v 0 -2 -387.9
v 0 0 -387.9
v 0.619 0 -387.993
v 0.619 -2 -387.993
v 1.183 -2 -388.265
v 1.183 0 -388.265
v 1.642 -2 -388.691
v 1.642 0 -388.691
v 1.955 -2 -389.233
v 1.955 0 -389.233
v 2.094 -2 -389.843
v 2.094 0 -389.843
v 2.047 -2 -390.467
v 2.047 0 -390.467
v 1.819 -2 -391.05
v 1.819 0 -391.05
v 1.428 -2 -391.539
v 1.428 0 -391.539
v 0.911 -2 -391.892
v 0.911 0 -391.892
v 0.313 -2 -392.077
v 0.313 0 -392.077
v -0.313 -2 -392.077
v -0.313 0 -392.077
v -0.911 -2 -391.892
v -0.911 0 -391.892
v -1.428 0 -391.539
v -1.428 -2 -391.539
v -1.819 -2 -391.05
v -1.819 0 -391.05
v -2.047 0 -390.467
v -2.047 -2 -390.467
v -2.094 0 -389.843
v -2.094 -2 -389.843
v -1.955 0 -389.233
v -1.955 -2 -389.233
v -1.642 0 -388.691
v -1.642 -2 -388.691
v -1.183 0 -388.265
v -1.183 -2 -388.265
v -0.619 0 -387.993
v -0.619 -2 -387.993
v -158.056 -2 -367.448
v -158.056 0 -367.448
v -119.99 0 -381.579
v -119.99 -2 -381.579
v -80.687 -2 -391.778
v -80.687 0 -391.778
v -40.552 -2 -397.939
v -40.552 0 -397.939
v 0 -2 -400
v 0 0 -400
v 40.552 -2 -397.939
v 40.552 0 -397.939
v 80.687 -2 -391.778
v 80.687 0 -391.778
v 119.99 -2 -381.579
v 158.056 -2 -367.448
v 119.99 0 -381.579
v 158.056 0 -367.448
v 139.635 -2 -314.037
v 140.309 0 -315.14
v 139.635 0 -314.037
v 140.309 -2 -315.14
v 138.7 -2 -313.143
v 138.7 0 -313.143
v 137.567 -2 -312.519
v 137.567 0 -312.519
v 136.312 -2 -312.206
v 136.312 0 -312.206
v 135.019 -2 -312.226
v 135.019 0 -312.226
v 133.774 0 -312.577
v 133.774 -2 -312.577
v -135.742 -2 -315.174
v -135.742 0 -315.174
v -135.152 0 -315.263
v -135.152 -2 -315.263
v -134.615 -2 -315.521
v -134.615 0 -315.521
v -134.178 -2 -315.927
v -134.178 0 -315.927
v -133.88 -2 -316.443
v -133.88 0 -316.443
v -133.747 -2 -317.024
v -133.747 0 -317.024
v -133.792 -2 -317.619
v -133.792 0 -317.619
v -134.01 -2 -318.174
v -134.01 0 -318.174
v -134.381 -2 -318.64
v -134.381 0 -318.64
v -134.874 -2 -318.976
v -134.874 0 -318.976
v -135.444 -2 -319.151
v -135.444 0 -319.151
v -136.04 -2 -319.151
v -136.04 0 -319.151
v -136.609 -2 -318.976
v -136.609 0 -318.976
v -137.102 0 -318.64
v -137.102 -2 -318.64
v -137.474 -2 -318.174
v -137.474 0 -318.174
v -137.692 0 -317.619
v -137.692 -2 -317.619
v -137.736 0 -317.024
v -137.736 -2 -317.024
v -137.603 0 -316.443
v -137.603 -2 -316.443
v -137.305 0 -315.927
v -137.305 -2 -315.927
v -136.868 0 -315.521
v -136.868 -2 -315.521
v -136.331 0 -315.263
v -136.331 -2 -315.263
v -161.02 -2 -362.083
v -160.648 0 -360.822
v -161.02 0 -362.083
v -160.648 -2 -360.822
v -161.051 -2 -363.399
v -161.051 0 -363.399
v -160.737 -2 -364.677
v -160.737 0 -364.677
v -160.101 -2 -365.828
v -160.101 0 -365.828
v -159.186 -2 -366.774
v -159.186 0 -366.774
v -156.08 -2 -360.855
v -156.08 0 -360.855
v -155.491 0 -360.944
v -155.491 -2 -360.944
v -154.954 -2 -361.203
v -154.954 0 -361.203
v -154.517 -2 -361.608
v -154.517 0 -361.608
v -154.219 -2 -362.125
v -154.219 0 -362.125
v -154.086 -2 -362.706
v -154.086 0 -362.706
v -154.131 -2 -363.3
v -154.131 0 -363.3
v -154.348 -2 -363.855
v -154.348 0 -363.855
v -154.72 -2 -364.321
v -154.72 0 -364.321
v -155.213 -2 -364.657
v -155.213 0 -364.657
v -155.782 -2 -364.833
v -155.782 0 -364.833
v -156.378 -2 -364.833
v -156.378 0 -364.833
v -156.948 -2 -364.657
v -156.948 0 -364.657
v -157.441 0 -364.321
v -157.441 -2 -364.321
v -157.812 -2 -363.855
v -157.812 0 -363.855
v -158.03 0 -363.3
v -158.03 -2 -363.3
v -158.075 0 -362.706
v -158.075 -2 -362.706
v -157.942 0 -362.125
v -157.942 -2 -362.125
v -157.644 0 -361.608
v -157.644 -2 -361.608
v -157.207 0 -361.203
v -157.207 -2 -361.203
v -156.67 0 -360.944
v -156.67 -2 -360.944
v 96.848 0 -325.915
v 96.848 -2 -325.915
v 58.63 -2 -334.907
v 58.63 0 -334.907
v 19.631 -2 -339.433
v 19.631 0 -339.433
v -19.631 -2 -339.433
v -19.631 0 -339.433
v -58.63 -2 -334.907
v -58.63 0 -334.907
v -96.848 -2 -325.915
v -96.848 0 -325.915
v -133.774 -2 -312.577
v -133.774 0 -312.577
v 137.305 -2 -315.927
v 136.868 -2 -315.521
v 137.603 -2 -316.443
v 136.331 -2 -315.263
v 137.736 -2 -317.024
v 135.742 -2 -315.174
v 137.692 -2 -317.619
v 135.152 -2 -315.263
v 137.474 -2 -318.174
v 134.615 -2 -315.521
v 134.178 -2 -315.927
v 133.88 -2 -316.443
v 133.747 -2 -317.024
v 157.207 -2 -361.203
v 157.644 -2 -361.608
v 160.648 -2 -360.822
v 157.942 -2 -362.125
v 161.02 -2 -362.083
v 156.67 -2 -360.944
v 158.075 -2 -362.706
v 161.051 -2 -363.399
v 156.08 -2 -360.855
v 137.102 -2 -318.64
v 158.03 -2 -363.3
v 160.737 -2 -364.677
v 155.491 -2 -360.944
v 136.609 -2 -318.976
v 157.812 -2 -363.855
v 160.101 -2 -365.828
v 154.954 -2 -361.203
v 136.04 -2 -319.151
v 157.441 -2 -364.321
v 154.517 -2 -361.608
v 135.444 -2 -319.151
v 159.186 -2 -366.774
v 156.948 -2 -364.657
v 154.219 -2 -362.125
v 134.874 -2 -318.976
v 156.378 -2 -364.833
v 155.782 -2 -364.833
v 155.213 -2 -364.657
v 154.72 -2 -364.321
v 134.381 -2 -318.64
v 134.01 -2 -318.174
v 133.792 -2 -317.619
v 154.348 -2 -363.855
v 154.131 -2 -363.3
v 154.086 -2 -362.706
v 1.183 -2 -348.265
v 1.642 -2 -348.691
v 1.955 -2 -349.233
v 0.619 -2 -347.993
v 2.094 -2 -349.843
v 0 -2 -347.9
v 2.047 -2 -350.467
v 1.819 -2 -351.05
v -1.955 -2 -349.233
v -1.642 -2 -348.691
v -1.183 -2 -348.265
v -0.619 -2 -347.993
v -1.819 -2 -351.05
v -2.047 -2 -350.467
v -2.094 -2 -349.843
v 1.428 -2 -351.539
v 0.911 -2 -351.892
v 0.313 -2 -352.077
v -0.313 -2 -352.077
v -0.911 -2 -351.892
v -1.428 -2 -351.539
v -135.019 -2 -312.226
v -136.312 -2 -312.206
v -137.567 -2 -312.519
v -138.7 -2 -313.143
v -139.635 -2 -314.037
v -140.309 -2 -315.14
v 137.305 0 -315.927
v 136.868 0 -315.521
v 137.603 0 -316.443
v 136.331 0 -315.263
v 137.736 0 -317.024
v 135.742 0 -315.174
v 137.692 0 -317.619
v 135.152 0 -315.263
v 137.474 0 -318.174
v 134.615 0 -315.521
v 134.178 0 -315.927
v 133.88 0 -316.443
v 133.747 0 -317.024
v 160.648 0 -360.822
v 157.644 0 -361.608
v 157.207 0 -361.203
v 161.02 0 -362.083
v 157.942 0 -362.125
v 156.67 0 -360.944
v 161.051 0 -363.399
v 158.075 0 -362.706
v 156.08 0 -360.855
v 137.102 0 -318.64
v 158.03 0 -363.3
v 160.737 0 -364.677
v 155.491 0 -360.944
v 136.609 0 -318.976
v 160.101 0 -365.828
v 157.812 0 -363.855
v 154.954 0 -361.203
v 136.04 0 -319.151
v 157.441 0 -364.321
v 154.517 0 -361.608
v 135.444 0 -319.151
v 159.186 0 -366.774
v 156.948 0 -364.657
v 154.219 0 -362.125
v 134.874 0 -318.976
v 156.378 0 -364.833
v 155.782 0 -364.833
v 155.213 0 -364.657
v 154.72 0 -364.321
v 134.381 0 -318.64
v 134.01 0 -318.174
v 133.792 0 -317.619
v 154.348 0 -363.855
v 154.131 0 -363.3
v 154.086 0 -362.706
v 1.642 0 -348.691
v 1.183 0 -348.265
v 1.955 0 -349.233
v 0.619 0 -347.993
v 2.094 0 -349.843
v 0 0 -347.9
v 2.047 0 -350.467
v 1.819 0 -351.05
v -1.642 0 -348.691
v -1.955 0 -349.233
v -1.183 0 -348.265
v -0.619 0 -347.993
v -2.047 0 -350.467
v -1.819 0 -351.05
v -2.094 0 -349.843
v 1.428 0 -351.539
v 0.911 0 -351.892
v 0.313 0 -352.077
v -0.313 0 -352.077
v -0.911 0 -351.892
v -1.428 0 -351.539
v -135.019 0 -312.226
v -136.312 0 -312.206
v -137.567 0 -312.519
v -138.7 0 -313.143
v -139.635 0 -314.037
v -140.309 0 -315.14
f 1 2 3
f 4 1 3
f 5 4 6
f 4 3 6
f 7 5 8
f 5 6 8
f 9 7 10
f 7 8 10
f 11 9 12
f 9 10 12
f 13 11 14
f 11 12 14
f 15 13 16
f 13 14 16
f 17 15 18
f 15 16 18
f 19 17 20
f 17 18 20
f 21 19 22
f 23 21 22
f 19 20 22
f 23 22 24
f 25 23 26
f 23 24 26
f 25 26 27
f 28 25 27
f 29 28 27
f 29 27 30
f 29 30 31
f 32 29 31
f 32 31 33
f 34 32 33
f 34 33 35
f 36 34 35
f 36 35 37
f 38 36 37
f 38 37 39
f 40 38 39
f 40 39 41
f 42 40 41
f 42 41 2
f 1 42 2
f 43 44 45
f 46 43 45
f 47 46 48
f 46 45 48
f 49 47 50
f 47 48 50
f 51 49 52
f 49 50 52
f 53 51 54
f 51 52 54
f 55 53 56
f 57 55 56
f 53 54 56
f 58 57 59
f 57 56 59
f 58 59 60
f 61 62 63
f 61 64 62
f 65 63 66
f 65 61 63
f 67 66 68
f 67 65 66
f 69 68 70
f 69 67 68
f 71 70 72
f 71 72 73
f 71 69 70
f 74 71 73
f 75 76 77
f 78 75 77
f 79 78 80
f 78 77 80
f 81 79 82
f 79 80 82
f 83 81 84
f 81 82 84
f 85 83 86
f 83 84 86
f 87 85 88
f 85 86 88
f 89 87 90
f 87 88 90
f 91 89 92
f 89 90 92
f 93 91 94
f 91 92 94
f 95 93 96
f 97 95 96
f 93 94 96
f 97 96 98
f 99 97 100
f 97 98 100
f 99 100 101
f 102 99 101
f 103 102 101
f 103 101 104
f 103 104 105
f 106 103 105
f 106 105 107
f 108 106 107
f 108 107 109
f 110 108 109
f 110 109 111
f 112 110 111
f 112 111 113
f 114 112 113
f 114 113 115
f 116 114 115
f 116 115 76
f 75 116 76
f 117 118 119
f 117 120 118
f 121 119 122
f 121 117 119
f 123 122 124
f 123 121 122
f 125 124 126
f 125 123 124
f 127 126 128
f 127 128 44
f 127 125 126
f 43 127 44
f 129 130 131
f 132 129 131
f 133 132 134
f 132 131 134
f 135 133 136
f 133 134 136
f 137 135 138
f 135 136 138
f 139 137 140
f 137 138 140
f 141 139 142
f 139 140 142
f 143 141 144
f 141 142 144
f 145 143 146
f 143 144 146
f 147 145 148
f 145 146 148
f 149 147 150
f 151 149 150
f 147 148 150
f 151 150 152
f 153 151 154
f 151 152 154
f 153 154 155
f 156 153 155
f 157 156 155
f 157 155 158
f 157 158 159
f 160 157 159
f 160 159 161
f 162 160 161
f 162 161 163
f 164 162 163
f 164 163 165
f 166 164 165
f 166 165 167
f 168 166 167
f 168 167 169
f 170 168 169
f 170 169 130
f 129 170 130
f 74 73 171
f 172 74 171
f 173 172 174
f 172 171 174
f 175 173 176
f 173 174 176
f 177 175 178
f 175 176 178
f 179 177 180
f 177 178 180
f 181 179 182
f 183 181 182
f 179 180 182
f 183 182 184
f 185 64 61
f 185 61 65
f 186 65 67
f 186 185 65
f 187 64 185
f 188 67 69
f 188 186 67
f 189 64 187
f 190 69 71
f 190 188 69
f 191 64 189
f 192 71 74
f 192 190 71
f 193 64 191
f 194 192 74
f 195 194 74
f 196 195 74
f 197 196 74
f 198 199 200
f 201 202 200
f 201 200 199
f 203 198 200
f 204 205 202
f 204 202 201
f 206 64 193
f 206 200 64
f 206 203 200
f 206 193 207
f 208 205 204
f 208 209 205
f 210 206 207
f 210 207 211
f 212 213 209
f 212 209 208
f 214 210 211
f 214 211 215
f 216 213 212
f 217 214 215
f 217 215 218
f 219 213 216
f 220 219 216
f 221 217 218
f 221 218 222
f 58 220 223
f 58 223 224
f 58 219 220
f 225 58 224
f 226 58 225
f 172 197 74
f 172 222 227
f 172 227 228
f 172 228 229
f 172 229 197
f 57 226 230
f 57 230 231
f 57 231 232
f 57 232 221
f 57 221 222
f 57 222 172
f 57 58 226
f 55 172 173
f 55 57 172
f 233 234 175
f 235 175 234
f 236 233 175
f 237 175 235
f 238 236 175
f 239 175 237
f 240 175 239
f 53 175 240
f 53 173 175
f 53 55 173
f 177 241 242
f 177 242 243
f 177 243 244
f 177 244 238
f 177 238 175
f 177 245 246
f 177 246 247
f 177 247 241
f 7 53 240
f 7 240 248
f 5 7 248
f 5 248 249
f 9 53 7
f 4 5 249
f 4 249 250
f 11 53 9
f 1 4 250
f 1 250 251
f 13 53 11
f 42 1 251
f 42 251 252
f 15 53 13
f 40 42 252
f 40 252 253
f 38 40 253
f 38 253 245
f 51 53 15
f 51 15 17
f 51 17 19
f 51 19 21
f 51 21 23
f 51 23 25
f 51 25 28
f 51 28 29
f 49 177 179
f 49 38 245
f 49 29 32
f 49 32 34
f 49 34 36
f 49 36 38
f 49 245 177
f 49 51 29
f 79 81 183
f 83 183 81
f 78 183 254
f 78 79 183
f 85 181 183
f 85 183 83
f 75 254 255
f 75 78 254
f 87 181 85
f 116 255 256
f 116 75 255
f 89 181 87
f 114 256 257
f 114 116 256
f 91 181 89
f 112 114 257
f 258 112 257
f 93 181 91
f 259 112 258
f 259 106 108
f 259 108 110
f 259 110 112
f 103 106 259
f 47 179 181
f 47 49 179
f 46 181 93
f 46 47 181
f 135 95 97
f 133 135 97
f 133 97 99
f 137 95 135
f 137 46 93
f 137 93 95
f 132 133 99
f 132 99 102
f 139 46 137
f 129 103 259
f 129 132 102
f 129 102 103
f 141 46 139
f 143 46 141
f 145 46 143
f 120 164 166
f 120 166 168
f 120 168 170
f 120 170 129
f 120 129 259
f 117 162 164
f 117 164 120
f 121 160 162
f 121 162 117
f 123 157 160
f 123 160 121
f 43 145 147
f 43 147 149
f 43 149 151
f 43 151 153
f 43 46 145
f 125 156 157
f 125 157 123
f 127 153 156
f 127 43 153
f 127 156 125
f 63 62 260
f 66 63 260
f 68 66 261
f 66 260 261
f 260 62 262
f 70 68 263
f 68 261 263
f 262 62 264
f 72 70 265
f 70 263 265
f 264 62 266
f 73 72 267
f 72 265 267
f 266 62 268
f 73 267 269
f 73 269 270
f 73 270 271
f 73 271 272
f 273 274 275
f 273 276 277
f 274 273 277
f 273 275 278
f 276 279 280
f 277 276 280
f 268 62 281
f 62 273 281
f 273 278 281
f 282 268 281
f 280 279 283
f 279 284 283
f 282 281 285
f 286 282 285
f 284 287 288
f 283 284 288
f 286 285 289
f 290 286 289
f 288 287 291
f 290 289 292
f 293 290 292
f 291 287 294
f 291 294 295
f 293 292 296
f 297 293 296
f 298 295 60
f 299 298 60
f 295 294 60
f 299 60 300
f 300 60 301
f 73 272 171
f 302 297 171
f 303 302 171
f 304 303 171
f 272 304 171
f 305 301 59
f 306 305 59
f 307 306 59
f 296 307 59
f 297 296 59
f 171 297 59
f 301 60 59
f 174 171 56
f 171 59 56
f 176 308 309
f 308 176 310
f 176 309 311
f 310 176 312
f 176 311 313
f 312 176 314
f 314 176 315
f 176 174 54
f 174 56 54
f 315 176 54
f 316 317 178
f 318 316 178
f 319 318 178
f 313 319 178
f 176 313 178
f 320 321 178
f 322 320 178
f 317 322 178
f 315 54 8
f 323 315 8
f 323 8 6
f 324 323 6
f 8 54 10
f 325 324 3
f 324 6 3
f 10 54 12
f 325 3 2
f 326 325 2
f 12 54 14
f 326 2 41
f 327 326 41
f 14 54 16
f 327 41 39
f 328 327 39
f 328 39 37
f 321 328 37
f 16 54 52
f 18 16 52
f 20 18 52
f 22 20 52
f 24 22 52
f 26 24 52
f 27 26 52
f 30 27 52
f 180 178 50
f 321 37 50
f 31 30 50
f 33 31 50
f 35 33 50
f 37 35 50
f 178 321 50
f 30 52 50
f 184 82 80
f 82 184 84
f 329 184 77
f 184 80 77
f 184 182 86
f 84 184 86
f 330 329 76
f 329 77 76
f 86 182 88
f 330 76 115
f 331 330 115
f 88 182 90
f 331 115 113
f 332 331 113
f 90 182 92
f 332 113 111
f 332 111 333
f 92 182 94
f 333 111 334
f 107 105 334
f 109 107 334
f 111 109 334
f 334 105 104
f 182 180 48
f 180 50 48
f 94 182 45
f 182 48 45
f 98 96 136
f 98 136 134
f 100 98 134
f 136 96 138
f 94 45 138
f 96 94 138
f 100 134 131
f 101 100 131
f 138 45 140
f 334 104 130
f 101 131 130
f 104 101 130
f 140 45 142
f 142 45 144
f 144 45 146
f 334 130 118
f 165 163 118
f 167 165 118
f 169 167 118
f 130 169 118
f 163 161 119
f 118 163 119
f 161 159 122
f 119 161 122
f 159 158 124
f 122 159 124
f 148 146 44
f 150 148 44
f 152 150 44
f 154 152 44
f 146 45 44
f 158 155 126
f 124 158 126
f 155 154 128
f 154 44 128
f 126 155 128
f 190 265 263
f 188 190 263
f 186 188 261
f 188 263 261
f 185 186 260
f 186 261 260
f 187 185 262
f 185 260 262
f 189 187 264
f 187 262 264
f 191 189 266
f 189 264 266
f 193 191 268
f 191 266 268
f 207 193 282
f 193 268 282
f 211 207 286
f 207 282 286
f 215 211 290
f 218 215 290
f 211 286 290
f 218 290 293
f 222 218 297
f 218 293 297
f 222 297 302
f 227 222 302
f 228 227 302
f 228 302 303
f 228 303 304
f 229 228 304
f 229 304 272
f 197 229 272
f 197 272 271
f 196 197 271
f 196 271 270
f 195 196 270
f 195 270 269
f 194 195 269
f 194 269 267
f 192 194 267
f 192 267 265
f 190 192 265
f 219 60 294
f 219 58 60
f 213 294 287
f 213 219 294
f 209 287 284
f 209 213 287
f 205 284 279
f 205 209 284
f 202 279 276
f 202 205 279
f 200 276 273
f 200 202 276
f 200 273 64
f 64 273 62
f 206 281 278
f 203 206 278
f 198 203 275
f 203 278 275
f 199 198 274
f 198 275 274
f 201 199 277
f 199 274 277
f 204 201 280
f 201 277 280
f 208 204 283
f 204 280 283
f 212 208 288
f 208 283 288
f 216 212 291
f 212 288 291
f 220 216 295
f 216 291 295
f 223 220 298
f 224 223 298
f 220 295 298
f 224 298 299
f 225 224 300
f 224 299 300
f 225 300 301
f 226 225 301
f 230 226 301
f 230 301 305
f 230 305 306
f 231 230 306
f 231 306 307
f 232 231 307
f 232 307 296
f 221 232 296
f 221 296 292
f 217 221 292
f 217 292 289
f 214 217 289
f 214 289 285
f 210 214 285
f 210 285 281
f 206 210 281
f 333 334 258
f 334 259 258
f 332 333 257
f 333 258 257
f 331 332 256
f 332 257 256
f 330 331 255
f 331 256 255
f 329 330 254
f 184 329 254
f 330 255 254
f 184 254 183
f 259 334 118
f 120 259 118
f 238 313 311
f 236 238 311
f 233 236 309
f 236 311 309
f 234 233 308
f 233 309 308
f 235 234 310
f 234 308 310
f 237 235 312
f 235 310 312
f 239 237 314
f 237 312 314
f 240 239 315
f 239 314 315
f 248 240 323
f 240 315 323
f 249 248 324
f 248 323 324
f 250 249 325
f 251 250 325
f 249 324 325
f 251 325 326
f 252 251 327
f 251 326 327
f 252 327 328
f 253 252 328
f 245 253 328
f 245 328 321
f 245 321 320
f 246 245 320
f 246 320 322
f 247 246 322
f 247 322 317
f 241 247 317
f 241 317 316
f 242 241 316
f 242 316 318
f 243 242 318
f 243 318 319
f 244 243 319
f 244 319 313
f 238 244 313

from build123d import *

# Parameters (mm, degrees)
SM_BASE_FLANGE_1_DEPTH = 2
FILLET_1_R             = 5
SKETCH_2_R             = 2.1
CUT_EXTRUDE_1_DEPTH    = 10
SKETCH_3_R             = 2
CUT_EXTRUDE_2_DEPTH    = 10


# Sheet-metal steps are written as plain solids
with BuildPart() as part:
    # Sketch 1 → Базовая кромка1 (new body)
    with BuildSketch(Plane(origin=(0, 0, 0), x_dir=(1, 0, 0), z_dir=(0, 1, 0))):
        with BuildLine():
            Line((-138.290458646, 310.605455598), (-162.69465723, 365.418183057))
            ThreePointArc((-162.69465723, 365.418183057), (0, 400), (162.69465723, 365.418183057))
            Line((162.69465723, 365.418183057), (138.290458646, 310.605455598))
            ThreePointArc((138.290458646, 310.605455598), (0, 340), (-138.290458646, 310.605455598))
        make_face()
    extrude(amount=-SM_BASE_FLANGE_1_DEPTH)

    # Скругление1
    fillet_1_edges = [part.edges().sort_by_distance(p)[0] for p in [
        (-138.290458646, -1, -310.605455598),
        (-162.69465723, -1, -365.418183057),
        (162.69465723, -1, -365.418183057),
        (138.290458646, -1, -310.605455598),
    ]]
    fillet(fillet_1_edges, radius=FILLET_1_R)

    # Эскиз2 → Вырез-Вытянуть1 (cut)
    with BuildSketch(Plane(origin=(0, 0, 0), x_dir=(1, 0, 0), z_dir=(0, 1, 0))):
        with Locations(Location((0, 350, 0), (0, 0, 270))):
            Circle(SKETCH_2_R)
        with Locations(Location((0, 390, 0), (0, 0, 270))):
            Circle(SKETCH_2_R)
    extrude(amount=-CUT_EXTRUDE_1_DEPTH, mode=Mode.SUBTRACT)

    # Эскиз3 → Вырез-Вытянуть2 (cut)
    with BuildSketch(Plane(origin=(0, 0, 0), x_dir=(1, 0, 0), z_dir=(0, 1, 0))):
        with Locations(Location((-135.741676964, 317.173764891, 0), (0, 0, 270))):
            Circle(SKETCH_3_R)
        with Locations(Location((-156.080374798, 362.85522816, 0), (0, 0, 270))):
            Circle(SKETCH_3_R)
        with Locations(Location((135.741676964, 317.173764891, 0), (0, 0, 270))):
            Circle(SKETCH_3_R)
        with Locations(Location((156.080374798, 362.85522816, 0), (0, 0, 270))):
            Circle(SKETCH_3_R)
    extrude(amount=-CUT_EXTRUDE_2_DEPTH, mode=Mode.SUBTRACT)


solid = part.part
